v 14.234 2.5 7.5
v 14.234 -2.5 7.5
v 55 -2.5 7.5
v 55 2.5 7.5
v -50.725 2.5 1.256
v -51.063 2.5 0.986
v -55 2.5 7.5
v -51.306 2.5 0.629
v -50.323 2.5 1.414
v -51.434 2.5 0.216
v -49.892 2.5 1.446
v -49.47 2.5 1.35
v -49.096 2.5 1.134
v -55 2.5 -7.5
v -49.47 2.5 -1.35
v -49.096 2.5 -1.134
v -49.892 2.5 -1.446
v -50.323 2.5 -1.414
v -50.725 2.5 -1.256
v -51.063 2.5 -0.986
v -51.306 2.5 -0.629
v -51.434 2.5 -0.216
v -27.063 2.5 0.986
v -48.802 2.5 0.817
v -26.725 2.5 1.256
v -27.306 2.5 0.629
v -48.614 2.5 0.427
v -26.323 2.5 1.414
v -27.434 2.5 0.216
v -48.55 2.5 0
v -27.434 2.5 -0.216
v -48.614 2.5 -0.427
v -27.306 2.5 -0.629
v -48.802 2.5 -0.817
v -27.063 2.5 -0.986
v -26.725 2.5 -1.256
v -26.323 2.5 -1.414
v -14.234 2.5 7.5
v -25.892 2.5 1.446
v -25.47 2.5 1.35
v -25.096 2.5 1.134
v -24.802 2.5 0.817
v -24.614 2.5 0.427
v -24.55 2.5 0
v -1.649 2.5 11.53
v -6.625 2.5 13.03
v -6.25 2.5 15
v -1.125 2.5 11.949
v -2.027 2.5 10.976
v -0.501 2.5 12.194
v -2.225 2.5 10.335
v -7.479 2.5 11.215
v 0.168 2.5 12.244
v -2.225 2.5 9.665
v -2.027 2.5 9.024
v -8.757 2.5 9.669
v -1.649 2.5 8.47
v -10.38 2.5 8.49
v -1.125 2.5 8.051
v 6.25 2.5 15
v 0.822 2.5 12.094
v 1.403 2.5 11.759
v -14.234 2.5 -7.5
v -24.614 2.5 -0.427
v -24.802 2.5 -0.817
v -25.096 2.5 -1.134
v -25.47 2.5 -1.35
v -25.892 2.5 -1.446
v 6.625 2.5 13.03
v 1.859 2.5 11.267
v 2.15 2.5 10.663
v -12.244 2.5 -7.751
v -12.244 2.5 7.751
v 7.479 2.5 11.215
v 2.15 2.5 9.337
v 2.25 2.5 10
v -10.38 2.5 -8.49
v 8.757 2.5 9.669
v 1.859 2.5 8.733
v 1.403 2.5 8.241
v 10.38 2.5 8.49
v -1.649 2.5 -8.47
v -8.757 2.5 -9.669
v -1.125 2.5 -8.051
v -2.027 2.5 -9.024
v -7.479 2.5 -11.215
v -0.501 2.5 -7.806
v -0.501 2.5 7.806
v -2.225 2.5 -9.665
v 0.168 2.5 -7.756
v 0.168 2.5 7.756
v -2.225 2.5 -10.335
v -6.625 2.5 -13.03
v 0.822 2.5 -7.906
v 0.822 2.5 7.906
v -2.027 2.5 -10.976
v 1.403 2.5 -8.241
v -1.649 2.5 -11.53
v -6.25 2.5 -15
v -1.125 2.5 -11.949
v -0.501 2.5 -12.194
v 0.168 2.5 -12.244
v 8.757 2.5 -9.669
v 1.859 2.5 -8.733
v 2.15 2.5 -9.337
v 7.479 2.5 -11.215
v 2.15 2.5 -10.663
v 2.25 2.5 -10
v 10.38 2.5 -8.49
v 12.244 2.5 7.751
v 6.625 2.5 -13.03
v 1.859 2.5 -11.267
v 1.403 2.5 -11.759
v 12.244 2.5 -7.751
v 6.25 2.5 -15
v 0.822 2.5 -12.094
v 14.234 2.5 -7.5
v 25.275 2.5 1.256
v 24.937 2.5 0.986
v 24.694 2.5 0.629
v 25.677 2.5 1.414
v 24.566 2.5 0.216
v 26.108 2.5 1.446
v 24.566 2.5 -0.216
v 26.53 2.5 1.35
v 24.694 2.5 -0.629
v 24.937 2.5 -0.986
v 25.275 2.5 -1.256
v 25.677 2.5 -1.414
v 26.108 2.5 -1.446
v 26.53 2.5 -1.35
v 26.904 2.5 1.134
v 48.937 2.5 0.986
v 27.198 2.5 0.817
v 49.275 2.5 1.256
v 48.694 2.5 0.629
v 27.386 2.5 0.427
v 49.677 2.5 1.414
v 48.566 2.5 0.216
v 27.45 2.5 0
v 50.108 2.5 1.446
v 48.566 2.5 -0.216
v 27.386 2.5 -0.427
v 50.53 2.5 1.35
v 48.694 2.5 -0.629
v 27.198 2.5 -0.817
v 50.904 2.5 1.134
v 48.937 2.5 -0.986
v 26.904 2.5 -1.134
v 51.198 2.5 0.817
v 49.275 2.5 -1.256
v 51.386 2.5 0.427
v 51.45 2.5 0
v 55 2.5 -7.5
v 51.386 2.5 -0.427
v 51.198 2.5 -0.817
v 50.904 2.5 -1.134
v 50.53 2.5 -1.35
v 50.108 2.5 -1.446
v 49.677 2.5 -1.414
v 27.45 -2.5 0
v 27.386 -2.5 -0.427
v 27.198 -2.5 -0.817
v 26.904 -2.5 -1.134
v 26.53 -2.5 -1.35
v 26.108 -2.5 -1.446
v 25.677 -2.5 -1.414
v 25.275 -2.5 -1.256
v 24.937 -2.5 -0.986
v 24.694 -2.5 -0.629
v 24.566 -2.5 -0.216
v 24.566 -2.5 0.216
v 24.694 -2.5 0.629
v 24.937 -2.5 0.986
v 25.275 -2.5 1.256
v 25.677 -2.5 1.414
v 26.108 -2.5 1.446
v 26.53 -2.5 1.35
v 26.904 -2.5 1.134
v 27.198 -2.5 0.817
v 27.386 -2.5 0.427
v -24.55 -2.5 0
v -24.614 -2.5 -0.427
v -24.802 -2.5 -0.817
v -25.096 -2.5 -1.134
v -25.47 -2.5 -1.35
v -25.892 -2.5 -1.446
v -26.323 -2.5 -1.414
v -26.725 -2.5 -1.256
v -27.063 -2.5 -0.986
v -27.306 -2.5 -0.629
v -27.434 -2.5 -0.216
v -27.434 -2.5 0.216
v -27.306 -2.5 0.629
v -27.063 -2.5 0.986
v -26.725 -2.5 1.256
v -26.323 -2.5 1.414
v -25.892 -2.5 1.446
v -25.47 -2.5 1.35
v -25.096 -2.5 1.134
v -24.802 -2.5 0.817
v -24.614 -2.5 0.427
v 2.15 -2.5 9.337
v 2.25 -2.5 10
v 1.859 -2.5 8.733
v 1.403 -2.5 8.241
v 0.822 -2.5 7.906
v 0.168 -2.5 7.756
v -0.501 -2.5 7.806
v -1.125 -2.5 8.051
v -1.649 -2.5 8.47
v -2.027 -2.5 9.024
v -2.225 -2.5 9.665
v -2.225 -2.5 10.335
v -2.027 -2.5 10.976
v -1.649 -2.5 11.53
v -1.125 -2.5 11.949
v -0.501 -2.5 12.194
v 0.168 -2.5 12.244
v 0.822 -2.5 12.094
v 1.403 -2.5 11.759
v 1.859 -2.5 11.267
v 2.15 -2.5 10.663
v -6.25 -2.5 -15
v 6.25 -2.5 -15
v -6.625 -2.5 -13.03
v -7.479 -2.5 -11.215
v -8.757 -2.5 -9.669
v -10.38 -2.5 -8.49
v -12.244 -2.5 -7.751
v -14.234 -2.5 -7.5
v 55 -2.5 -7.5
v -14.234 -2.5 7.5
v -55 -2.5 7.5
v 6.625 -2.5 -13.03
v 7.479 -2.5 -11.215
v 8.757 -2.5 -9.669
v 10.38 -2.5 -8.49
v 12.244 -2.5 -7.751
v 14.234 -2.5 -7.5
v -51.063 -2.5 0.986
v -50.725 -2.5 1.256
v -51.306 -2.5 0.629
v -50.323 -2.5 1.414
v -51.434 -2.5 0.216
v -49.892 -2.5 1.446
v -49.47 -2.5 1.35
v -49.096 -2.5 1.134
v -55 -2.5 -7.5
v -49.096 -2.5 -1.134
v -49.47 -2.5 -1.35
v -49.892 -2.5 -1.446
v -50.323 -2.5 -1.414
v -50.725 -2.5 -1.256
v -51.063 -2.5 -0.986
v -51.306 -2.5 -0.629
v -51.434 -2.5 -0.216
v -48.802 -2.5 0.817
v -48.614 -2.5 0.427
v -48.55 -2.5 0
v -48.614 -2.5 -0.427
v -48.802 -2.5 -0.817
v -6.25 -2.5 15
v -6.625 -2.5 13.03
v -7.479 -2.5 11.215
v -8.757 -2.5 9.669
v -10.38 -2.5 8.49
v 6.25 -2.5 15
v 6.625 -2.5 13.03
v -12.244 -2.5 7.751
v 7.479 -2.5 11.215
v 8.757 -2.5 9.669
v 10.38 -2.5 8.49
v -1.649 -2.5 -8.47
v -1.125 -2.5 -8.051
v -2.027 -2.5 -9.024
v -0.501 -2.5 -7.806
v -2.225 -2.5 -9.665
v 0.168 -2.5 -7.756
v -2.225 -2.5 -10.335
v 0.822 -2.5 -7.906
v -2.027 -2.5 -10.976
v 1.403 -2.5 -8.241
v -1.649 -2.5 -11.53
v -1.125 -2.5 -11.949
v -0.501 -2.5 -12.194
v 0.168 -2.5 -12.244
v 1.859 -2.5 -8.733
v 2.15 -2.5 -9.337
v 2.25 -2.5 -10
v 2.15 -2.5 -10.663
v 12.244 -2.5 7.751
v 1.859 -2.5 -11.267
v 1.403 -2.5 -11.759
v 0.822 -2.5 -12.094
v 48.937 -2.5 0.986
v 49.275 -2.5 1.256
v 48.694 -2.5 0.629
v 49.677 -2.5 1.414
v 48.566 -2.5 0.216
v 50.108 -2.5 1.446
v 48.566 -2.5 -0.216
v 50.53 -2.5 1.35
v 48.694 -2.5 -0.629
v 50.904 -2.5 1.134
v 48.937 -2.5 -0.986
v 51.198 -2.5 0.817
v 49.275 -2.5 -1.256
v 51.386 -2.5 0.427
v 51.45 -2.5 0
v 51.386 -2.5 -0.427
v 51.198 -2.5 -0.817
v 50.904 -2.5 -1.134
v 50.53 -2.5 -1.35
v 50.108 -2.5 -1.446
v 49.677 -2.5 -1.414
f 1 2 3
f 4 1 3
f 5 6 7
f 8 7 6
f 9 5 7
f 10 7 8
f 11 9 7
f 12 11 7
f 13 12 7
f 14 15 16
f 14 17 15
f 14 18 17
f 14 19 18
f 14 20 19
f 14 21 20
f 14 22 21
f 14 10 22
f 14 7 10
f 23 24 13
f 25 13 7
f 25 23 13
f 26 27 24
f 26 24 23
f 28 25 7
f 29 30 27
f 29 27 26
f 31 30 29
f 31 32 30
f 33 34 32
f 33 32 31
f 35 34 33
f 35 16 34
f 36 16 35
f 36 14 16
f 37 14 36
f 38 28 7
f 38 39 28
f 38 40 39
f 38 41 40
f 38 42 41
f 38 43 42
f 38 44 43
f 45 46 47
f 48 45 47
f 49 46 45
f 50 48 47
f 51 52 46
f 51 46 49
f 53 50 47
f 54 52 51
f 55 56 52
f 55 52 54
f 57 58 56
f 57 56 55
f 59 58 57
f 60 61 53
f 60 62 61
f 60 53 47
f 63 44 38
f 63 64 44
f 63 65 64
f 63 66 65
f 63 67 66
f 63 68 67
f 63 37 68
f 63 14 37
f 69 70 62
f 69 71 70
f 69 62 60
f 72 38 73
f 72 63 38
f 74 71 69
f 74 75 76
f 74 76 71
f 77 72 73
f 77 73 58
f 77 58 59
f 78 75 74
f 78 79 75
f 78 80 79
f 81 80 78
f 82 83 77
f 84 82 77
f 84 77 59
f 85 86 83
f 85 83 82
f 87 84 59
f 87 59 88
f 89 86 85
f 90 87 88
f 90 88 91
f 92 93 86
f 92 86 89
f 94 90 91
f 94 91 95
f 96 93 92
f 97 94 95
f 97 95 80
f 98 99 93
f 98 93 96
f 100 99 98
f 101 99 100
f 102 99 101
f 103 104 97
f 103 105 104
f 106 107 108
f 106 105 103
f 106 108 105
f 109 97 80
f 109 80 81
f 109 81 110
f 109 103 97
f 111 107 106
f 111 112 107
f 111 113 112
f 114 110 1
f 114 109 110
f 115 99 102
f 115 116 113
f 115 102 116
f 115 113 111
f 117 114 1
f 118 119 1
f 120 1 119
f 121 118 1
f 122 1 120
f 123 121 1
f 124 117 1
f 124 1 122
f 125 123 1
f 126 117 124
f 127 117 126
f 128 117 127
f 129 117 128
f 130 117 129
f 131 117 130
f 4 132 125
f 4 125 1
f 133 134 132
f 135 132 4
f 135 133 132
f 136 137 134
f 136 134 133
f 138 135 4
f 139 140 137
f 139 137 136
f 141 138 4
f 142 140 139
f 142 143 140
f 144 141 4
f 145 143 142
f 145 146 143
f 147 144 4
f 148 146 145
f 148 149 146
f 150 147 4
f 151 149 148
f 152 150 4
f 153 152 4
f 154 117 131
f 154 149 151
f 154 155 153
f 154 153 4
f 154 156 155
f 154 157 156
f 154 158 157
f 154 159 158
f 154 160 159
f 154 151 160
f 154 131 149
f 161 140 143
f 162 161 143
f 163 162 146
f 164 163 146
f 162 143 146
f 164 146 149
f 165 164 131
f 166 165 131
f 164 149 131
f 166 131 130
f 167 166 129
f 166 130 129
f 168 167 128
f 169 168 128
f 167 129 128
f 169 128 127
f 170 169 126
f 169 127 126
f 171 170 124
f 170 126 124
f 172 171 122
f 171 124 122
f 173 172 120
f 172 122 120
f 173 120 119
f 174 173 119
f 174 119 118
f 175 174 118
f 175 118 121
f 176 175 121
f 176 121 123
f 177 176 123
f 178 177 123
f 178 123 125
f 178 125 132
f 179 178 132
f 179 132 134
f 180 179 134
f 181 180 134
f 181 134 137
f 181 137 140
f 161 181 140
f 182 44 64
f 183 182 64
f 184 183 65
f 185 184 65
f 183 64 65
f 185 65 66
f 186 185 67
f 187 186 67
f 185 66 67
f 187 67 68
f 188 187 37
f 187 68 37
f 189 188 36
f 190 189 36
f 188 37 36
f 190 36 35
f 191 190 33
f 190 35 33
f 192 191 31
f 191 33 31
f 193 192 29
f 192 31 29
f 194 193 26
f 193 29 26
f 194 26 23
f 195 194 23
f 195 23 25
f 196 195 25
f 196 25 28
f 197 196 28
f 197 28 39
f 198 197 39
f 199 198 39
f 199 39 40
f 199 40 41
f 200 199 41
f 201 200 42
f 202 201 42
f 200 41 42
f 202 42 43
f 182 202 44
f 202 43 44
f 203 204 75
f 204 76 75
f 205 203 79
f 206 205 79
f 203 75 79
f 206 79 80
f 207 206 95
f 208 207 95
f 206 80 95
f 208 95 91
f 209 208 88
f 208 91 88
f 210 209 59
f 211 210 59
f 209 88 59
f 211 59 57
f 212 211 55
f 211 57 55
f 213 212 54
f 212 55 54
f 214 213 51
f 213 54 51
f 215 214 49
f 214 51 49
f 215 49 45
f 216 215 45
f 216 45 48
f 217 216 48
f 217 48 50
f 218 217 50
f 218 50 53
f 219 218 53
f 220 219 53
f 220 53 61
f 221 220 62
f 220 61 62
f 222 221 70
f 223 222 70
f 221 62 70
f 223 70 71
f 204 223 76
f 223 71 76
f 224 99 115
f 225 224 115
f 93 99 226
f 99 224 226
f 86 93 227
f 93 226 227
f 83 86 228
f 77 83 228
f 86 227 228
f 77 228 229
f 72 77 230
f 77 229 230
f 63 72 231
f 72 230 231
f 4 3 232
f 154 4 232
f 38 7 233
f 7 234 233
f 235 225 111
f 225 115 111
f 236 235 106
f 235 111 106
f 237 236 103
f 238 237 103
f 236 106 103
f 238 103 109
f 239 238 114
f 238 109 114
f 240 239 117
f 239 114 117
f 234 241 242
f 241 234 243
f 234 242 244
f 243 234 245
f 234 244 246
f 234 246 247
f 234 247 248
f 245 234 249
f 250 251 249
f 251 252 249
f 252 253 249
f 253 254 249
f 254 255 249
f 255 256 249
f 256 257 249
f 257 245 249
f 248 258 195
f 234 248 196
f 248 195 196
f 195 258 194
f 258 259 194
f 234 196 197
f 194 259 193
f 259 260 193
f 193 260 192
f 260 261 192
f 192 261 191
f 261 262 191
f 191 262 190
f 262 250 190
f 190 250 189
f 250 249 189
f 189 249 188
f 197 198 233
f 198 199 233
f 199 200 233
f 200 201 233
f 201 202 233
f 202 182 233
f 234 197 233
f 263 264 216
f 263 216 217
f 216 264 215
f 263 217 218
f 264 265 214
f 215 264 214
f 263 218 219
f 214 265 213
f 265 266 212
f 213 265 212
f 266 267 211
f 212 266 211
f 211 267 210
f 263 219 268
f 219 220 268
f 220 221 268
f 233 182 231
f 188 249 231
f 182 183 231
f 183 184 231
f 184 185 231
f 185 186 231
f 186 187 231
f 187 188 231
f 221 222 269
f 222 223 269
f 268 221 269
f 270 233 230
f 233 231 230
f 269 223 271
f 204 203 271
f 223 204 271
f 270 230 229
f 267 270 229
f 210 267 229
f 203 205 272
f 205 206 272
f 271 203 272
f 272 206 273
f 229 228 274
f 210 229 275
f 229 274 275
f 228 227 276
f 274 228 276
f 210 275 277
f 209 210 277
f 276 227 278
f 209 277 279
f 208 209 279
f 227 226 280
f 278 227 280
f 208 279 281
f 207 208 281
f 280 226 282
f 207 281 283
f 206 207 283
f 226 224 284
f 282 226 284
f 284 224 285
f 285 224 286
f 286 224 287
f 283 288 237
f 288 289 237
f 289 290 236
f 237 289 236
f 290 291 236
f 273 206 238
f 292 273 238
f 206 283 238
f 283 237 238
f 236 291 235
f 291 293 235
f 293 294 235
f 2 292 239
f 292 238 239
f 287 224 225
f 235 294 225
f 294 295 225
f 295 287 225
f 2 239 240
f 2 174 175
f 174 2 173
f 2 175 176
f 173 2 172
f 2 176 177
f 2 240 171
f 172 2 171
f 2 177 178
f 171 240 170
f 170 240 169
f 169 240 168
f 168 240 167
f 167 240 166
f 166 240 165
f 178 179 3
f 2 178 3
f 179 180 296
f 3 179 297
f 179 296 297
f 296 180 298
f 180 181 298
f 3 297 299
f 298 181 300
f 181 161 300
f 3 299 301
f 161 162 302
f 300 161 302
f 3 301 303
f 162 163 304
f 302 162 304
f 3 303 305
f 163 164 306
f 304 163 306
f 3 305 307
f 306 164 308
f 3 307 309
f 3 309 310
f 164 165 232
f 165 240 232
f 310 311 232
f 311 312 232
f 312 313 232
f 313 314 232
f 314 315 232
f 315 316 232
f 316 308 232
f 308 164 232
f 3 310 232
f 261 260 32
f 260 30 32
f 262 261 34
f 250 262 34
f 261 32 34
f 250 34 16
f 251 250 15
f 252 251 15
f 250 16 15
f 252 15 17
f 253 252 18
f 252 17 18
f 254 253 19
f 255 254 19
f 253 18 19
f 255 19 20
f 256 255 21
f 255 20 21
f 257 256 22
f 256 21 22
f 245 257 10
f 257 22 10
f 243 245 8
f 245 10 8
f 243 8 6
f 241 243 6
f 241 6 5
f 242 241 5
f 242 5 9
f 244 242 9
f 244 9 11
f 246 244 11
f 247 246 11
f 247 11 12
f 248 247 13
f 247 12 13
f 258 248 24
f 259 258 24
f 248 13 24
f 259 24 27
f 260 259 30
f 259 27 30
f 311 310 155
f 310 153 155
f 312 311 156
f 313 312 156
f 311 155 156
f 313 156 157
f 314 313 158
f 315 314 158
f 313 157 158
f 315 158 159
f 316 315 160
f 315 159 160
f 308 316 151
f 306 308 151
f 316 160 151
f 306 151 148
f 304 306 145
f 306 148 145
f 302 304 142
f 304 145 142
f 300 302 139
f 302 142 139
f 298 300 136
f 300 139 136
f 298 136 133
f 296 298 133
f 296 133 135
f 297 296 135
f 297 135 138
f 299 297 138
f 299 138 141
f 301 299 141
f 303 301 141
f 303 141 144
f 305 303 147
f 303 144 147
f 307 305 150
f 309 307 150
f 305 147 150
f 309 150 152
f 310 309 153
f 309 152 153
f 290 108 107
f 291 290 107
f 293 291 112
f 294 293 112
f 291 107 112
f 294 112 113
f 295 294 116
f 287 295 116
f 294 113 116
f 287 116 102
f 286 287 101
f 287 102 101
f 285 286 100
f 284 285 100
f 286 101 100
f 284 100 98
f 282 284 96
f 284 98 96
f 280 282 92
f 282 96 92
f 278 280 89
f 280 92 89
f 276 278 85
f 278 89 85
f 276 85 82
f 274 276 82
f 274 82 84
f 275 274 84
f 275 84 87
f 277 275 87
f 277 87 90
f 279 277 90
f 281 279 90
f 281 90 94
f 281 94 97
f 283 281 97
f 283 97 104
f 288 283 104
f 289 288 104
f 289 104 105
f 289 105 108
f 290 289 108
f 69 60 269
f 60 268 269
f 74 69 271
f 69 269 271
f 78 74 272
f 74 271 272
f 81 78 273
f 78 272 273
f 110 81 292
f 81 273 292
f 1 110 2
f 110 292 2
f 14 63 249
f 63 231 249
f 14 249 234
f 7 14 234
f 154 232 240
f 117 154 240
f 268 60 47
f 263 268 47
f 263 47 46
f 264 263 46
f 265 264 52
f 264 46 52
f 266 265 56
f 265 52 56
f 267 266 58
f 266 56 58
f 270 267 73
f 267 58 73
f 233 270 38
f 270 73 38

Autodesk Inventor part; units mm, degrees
ref_plane "YZ Plane" through (0, 0, 0) normal (1, 0, 0) x (0, 1, 0)
ref_plane "XZ Plane" through (0, 0, 0) normal (0, 1, 0) x (-1, 0, 0)
ref_plane "XY Plane" through (0, 0, 0) normal (0, 0, 1) x (1, 0, 0)
sketch "スケッチ1" plane through (0, 0, 0) normal (0, 1, 0) x (-1, 0, 0)
  line L0 (-55, -7.5) -> (55, -7.5)
  line L1 (55, -7.5) -> (55, 7.5)
  line L2 (55, 7.5) -> (-55, 7.5)
  line L3 (-55, 7.5) -> (-55, -7.5)
  line L4 (-55, -7.5) -> (55, 7.5) construction
  line L5 (55, -7.5) -> (-55, 7.5) construction
  point P0 (0, 0)
  dimension "d0" = 110
  dimension "d1" = 15
extrude "押し出し1" add sketch "スケッチ1" along normal mid plane 5
sketch "スケッチ2" plane through (0, 2.5, 0) normal (0, 1, 0) x (1, 0, 0)
  circle A0 centre (50, 0) radius 1.45
  circle A1 centre (-50, 0) radius 1.45
  point P0 (0, 0)
  dimension "d4" = 2.9
  dimension "d5" = 2.9
extrude "押し出し2" cut sketch "スケッチ2" against normal blind 5
sketch "スケッチ3" plane through (0, 2.5, 0) normal (0, 1, 0) x (1, 0, 0)
  circle A0 centre (26, 0) radius 1.45
  circle A1 centre (-26, 0) radius 1.45
  point P0 (0, 0)
  dimension "d8" = 2.9
  dimension "d9" = 2.9
extrude "押し出し3" cut sketch "スケッチ3" against normal blind 5
sketch "スケッチ4" plane through (0, 2.5, 0) normal (0, 1, 0) x (1, 0, 0)
  line L0 (-6.25, 15) -> (6.25, 15)
  line L1 (6.25, 15) -> (6.25, -15)
  line L2 (6.25, -15) -> (-6.25, -15)
  line L3 (-6.25, -15) -> (-6.25, 15)
  line L4 (-6.25, 15) -> (6.25, -15) construction
  line L5 (6.25, 15) -> (-6.25, -15) construction
  point P0 (0, 0)
  dimension "d12" = 12.5
  dimension "d13" = 30
extrude "押し出し4" add sketch "スケッチ4" against normal blind 5
fillet "フィレット1" radius 8 4 edges at (6.25, 0, 7.5) (-6.25, 0, 7.5) (-6.25, 0, -7.5) (6.25, 0, -7.5)
sketch "スケッチ5" plane through (0, 2.5, 0) normal (0, 1, 0) x (1, 0, 0)
  circle A0 centre (0, -10) radius 2.25
  circle A1 centre (0, 10) radius 2.25
  point P0 (0, 0)
  dimension "d17" = 4.5
  dimension "d18" = 4.5
extrude "押し出し5" cut sketch "スケッチ5" against normal blind 5
properties part number "board2"
